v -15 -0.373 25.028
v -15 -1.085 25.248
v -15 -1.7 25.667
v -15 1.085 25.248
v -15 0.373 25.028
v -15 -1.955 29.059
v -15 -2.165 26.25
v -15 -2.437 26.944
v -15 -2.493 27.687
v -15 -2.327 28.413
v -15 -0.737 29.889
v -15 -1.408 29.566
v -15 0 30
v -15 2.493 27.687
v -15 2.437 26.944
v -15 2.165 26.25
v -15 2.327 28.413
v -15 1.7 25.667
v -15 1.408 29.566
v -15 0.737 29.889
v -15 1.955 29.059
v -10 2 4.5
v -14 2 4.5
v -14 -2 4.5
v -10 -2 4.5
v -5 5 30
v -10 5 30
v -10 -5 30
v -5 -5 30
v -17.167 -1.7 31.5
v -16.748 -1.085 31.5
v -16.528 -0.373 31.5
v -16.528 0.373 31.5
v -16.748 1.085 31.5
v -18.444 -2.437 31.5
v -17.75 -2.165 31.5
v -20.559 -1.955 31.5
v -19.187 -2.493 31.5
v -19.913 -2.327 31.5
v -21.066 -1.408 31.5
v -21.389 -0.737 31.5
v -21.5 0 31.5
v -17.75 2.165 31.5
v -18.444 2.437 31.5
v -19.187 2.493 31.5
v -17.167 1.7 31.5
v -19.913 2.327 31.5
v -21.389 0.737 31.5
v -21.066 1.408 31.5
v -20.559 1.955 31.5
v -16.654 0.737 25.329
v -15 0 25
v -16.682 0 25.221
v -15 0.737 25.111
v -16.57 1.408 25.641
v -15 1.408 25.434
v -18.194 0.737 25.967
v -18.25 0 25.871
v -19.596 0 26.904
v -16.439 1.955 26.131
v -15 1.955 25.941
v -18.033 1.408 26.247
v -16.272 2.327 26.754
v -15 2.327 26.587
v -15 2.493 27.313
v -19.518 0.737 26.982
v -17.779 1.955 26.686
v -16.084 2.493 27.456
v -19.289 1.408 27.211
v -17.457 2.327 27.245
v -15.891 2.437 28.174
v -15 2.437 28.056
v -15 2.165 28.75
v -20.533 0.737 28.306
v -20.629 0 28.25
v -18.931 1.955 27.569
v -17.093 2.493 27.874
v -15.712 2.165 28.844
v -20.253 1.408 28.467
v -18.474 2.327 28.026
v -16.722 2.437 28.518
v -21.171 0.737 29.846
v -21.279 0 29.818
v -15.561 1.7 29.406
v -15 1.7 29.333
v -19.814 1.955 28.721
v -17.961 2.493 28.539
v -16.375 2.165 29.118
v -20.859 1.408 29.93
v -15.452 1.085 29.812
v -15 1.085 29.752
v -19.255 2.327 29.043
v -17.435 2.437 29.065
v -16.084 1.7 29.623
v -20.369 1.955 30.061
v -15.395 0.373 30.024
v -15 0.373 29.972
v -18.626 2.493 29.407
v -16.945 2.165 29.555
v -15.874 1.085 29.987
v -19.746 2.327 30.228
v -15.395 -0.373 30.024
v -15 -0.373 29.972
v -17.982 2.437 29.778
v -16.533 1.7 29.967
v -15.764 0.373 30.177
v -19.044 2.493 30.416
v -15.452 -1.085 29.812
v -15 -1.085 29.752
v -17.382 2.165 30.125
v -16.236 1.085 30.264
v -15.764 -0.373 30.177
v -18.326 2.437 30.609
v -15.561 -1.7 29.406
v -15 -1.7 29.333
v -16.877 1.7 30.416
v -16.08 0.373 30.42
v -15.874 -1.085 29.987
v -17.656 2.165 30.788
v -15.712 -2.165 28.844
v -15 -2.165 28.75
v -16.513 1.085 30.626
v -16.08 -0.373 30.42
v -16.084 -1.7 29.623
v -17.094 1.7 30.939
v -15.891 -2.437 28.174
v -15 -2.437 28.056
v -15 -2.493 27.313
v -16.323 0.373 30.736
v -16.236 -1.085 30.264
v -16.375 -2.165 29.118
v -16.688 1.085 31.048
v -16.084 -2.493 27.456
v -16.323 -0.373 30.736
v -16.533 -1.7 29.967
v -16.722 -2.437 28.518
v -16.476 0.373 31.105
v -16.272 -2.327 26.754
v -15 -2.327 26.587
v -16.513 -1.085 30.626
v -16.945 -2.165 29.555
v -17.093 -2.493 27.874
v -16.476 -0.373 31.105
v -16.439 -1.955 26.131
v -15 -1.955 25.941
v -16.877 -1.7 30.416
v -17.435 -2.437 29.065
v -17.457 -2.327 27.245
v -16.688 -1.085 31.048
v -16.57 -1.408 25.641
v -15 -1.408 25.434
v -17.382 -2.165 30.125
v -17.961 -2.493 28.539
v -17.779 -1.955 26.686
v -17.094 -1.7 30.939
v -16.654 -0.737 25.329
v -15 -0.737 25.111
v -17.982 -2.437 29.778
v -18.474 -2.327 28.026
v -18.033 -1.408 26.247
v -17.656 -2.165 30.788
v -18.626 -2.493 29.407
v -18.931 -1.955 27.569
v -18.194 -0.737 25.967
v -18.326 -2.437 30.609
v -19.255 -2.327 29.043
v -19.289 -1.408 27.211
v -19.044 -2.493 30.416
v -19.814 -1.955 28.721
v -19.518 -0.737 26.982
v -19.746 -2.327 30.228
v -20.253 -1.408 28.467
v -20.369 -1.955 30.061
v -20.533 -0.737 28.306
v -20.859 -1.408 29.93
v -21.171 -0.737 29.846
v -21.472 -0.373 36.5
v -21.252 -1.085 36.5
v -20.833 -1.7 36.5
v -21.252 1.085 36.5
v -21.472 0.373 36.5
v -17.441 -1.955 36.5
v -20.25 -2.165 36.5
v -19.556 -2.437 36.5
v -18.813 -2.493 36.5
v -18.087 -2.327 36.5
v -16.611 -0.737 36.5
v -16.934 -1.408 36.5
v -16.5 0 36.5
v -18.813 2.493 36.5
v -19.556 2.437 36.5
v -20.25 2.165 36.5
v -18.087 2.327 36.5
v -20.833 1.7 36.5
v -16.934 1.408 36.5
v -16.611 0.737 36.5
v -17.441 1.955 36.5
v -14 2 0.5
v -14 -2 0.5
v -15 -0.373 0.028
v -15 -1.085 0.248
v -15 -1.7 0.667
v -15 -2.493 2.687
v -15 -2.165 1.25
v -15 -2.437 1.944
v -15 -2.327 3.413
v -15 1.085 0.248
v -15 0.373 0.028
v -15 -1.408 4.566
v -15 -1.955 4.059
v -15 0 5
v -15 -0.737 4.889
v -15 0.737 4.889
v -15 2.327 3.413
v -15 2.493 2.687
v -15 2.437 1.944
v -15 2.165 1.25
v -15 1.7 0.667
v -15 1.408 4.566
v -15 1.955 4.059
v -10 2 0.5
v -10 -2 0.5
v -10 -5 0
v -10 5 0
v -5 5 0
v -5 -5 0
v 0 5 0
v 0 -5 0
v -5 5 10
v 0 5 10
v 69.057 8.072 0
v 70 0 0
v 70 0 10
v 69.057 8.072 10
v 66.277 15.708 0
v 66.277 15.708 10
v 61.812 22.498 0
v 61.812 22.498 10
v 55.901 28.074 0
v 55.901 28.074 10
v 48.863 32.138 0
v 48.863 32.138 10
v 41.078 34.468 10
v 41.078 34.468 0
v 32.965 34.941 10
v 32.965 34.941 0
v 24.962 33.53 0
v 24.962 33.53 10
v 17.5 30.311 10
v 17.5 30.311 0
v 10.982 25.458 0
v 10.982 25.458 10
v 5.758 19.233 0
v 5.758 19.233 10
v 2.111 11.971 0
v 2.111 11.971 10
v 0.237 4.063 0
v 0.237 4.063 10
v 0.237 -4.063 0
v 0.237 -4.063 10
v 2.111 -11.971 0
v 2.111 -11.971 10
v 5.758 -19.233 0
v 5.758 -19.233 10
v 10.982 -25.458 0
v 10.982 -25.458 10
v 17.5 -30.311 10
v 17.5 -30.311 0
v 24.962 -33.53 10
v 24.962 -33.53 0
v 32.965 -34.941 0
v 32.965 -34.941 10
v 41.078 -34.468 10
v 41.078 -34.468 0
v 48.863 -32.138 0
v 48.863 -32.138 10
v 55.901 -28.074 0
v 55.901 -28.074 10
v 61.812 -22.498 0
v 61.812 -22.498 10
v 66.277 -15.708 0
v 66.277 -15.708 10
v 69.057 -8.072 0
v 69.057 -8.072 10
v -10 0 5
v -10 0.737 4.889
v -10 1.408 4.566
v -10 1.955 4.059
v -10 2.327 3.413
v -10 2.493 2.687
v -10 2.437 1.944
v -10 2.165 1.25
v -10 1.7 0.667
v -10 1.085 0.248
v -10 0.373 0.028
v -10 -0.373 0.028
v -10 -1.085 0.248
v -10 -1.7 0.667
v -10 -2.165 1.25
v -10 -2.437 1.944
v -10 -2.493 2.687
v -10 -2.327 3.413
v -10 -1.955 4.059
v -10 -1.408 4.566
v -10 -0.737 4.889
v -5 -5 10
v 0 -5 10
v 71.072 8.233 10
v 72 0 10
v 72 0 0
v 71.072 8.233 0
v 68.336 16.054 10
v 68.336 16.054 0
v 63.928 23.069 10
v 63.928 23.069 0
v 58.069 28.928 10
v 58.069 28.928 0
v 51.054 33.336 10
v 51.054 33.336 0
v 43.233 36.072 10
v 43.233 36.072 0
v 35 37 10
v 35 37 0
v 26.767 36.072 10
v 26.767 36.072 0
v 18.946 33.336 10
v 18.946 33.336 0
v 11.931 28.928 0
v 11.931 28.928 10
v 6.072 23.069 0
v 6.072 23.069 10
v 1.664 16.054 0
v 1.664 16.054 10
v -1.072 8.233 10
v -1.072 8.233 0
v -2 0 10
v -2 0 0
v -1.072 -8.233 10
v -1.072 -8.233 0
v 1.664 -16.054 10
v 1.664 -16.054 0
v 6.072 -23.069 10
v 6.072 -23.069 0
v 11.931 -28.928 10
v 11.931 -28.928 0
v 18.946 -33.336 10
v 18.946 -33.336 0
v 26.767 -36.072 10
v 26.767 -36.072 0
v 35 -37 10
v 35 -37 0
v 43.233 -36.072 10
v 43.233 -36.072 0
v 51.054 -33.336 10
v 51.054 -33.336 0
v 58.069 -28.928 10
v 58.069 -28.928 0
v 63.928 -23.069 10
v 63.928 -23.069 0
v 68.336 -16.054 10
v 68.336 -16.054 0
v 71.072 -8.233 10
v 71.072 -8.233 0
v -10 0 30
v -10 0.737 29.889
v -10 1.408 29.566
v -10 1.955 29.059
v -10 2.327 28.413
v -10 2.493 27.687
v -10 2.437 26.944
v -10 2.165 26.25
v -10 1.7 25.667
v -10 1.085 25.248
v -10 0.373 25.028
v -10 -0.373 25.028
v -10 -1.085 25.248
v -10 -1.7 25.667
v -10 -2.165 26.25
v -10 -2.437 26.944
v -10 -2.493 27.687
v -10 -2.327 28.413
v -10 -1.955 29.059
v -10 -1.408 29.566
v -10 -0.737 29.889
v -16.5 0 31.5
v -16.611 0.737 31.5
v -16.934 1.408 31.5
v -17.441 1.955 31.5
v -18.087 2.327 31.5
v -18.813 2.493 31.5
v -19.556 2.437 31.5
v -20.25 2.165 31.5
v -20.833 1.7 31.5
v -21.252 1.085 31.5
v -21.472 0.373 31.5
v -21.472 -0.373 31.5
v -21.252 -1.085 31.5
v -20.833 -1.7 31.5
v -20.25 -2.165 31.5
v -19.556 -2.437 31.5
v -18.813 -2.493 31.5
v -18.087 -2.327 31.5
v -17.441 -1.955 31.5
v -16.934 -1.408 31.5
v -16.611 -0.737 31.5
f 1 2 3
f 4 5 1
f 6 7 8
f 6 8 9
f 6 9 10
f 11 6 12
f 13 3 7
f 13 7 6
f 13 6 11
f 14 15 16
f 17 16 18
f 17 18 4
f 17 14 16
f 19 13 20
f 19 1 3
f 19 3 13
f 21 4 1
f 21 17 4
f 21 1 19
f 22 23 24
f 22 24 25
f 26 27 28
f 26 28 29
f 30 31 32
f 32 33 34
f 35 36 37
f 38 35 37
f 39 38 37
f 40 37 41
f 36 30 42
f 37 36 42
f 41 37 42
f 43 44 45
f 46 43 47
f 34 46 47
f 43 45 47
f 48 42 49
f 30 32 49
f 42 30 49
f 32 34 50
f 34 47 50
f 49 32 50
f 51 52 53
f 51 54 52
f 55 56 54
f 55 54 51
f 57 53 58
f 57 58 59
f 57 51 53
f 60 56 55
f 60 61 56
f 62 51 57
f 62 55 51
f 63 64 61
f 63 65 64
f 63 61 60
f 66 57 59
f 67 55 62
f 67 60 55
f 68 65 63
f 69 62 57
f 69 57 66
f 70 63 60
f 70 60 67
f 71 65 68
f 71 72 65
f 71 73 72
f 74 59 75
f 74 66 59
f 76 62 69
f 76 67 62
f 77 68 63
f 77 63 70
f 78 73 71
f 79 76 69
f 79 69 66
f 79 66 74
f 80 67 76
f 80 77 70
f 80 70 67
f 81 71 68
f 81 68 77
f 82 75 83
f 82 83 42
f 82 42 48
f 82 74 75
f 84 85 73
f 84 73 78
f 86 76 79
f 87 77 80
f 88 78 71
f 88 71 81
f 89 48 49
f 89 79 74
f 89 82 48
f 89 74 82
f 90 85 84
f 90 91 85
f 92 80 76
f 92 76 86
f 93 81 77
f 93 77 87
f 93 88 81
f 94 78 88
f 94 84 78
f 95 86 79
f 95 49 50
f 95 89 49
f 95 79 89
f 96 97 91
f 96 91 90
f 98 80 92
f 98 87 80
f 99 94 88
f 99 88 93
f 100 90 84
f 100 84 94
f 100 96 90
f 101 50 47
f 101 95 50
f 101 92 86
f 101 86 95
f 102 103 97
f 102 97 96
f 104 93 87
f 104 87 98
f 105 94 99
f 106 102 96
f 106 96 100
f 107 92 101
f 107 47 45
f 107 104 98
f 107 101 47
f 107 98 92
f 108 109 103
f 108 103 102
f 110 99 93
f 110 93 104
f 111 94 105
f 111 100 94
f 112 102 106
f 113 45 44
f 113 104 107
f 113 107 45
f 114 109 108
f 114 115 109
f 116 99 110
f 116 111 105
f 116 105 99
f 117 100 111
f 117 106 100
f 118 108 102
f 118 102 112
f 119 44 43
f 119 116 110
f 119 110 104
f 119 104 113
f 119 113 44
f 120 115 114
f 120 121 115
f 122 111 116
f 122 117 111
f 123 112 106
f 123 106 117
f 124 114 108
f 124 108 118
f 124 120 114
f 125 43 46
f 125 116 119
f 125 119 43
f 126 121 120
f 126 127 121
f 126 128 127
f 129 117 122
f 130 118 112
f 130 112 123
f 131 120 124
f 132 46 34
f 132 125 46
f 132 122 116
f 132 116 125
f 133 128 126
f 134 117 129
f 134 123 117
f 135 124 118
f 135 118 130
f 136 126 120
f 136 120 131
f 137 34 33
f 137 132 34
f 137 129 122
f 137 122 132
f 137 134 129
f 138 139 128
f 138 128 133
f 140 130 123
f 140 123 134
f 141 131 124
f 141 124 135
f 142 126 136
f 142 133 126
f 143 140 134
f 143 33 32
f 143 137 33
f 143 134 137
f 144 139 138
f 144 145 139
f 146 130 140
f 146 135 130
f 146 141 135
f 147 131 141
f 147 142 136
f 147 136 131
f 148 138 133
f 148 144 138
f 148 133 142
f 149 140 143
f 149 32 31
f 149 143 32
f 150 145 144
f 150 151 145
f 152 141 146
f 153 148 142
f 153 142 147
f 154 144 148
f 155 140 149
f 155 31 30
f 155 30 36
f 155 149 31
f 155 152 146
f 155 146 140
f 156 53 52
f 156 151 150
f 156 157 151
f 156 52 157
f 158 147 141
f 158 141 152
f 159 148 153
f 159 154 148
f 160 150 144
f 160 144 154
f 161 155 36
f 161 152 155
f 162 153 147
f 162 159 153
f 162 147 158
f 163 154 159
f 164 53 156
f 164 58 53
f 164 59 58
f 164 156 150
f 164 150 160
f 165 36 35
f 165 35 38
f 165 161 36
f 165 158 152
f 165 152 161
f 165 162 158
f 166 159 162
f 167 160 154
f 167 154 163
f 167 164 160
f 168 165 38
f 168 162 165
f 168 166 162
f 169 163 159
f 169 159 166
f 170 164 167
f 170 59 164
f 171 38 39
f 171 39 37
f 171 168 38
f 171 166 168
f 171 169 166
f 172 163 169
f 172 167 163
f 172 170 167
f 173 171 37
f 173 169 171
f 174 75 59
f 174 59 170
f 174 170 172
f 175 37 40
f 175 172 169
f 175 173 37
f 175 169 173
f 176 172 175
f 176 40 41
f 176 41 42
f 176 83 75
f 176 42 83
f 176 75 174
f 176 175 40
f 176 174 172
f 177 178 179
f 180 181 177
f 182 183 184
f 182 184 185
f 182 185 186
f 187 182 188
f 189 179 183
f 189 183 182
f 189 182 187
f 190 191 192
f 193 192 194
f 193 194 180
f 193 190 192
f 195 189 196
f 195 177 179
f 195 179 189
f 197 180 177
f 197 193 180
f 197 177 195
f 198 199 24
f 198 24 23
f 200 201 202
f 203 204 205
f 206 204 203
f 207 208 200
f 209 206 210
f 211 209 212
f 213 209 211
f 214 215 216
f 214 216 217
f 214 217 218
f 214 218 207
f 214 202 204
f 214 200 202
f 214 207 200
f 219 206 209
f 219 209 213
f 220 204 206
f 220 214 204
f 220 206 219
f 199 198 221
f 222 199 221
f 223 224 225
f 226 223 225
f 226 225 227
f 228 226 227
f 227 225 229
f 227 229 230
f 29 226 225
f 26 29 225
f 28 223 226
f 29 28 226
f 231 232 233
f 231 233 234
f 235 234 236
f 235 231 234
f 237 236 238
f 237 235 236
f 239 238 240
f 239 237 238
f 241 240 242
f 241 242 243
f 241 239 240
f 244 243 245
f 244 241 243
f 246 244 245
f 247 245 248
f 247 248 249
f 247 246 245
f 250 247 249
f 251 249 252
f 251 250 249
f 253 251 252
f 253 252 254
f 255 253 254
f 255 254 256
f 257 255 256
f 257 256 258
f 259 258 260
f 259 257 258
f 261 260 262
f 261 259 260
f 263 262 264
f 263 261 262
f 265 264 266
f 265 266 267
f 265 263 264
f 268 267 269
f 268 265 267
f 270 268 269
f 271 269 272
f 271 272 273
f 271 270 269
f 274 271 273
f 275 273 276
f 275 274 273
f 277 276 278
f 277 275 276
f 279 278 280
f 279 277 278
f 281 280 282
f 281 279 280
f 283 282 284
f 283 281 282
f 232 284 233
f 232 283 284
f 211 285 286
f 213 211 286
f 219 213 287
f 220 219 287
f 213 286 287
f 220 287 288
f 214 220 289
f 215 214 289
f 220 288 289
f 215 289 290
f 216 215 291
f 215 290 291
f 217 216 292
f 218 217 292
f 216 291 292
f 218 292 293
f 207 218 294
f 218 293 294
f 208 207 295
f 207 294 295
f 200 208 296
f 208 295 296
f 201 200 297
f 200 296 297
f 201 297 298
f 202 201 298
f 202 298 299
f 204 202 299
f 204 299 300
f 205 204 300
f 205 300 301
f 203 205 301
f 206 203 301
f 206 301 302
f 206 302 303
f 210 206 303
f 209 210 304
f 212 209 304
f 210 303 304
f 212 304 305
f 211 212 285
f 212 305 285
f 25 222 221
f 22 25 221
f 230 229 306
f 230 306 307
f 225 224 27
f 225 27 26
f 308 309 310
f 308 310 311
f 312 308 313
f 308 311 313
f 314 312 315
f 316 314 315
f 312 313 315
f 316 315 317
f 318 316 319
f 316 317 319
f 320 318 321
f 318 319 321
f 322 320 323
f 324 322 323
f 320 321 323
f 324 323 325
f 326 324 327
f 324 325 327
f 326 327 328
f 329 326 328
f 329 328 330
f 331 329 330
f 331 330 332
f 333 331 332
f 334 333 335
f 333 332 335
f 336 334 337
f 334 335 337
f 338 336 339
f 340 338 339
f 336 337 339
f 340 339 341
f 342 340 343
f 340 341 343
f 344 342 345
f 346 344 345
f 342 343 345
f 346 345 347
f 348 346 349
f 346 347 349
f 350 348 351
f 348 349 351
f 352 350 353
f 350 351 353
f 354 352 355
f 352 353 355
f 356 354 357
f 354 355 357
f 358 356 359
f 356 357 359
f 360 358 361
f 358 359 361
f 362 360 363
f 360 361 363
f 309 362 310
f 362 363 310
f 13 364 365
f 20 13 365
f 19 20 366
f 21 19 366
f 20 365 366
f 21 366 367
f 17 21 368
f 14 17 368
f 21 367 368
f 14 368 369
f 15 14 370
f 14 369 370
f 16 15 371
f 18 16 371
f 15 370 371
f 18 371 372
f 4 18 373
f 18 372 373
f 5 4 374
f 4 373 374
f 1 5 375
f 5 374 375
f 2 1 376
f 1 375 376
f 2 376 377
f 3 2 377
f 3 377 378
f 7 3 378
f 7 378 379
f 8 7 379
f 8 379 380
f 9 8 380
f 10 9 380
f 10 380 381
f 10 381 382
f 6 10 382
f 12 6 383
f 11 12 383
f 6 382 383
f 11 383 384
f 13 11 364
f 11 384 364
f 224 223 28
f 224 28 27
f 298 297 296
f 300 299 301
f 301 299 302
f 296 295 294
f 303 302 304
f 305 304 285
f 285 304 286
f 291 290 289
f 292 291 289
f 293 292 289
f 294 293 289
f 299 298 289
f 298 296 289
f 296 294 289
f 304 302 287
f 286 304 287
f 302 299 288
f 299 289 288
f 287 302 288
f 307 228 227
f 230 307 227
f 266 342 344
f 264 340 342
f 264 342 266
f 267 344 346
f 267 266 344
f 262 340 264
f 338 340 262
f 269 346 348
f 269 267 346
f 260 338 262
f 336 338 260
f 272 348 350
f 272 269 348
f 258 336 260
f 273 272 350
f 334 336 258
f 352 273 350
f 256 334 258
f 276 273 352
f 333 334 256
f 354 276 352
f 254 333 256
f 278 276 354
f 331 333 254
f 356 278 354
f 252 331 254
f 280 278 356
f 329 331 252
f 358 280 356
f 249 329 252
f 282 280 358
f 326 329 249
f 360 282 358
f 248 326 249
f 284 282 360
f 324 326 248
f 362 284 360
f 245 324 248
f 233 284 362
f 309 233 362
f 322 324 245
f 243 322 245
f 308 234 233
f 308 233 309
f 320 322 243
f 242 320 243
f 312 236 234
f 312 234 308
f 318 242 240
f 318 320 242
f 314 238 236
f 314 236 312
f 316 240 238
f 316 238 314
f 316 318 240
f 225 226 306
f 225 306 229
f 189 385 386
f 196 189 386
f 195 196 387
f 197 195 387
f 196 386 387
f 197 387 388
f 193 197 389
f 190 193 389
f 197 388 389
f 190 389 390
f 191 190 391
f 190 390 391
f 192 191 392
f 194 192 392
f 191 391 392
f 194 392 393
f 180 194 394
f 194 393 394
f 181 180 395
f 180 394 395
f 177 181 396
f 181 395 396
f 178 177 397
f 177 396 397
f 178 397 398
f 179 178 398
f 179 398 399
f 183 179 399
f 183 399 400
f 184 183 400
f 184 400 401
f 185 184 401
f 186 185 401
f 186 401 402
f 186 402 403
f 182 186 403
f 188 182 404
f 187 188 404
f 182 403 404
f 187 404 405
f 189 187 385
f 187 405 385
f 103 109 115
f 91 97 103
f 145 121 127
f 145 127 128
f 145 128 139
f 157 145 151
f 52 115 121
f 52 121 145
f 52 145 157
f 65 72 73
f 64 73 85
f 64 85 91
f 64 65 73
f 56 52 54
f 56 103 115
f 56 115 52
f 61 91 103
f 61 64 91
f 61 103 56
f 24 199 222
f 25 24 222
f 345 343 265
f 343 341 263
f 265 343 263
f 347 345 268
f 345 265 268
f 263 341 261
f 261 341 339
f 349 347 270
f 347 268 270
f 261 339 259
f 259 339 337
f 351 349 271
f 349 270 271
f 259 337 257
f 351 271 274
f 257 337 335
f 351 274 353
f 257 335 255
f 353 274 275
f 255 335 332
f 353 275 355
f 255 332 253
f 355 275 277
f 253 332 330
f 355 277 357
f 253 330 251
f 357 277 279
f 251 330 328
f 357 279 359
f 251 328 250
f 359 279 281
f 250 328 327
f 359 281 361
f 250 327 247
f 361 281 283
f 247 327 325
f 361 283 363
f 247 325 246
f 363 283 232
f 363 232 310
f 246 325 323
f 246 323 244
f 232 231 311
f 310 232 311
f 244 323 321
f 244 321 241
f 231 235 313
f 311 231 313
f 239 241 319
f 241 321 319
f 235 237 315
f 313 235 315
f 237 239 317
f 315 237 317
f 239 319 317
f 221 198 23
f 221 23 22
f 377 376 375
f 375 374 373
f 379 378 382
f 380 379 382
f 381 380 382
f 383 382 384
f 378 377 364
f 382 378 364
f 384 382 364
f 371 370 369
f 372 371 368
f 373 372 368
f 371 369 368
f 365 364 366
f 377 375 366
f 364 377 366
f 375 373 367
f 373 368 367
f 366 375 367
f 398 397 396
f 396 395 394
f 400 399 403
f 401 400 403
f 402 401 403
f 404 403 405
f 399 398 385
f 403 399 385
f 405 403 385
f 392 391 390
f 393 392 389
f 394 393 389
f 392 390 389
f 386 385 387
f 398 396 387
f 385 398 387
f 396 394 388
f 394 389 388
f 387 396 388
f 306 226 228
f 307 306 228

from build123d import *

# Parameters (mm, degrees)
BOX_W                   = 5
BOX_H                   = 10
BOX_DEPTH               = 10
BOX001_W                = 5
BOX001_H                = 10
BOX001_DEPTH            = 30
CYLINDER002_R           = 2.5
CYLINDER002_DEPTH       = 5
CYLINDER002_PITCH_ANGLE = -90
CYLINDER003_R           = 2.5
CYLINDER003_DEPTH       = 5
CYLINDER003_PITCH_ANGLE = -90
TORUS_R                 = 2.5
TORUS_ANGLE             = 90
CYLINDER004_R           = 2.5
CYLINDER004_DEPTH       = 5
BOX002_W                = 4
BOX002_H                = 4
BOX002_DEPTH            = 4
CYLINDER005_R           = 35
CYLINDER005_DEPTH       = 10
CYLINDER_R              = 37
CYLINDER_DEPTH          = 10


with BuildPart() as cube:
    # Box → Box (new body)
    with BuildSketch(Plane(origin=(-5, -5, 0), x_dir=(1, 0, 0), z_dir=(0, 0, 1))):
        with Locations((2.5, 5)):
            Rectangle(BOX_W, BOX_H)
    extrude(amount=BOX_DEPTH)


with BuildPart() as cube001:
    # Box001 → Box001 (new body)
    with BuildSketch(Plane(origin=(-10, -5, 0), x_dir=(1, 0, 0), z_dir=(0, 0, 1))):
        with Locations((2.5, 5)):
            Rectangle(BOX001_W, BOX001_H)
    extrude(amount=BOX001_DEPTH)


with BuildPart() as cylinder002:
    # Cylinder002 → Cylinder002 (new body)
    with BuildSketch(Plane.XY):
        Circle(CYLINDER002_R)
    extrude(amount=CYLINDER002_DEPTH)


with BuildPart() as cylinder002_1:
    # Cylinder002 pitch: moved
    add(cylinder002.part.rotate(Axis((0, 0, 0), (0, 1, 0)), CYLINDER002_PITCH_ANGLE))


with BuildPart() as cylinder002_2:
    # Cylinder002 placement: moved
    add(cylinder002_1.part.moved(Location((-10, 0, 2.5))))


with BuildPart() as cylinder003:
    # Cylinder003 → Cylinder003 (new body)
    with BuildSketch(Plane.XY):
        Circle(CYLINDER003_R)
    extrude(amount=CYLINDER003_DEPTH)


with BuildPart() as cylinder003_1:
    # Cylinder003 pitch: moved
    add(cylinder003.part.rotate(Axis((0, 0, 0), (0, 1, 0)), CYLINDER003_PITCH_ANGLE))


with BuildPart() as cylinder003_2:
    # Cylinder003 placement: moved
    add(cylinder003_1.part.moved(Location((-10, 0, 27.5))))


with BuildPart() as torus:
    # Torus → Torus (revolve)
    with BuildSketch(Plane(origin=(-15, 0, 31.5), x_dir=(0, 0, -1), z_dir=(1, 0, 0))):
        with Locations((4, 0)):
            Circle(TORUS_R)
    revolve(axis=Axis((-15, 0, 31.5), (0, 1, 0)), revolution_arc=TORUS_ANGLE)


with BuildPart() as cylinder004:
    # Cylinder004 → Cylinder004 (new body)
    with BuildSketch(Plane(origin=(-19, 0, 31.5), x_dir=(1, 0, 0), z_dir=(0, 0, 1))):
        Circle(CYLINDER004_R)
    extrude(amount=CYLINDER004_DEPTH)


with BuildPart() as cube002:
    # Box002 → Box002 (new body)
    with BuildSketch(Plane(origin=(-14, -2, 0.5), x_dir=(1, 0, 0), z_dir=(0, 0, 1))):
        with Locations((2, 2)):
            Rectangle(BOX002_W, BOX002_H)
    extrude(amount=BOX002_DEPTH)


with BuildPart() as cylinder005:
    # Cylinder005 → Cylinder005 (new body)
    with BuildSketch(Plane(origin=(35, 0, 0), x_dir=(1, 0, 0), z_dir=(0, 0, 1))):
        Circle(CYLINDER005_R)
    extrude(amount=CYLINDER005_DEPTH)


with BuildPart() as cut:
    # Cylinder → Cylinder (new body)
    with BuildSketch(Plane(origin=(35, 0, 0), x_dir=(1, 0, 0), z_dir=(0, 0, 1))):
        Circle(CYLINDER_R)
    extrude(amount=CYLINDER_DEPTH)

    # Cut: cut Cylinder005
    add(cylinder005.part, mode=Mode.SUBTRACT)


solid = Compound([cube.part, cube001.part, cylinder002_2.part, cylinder003_2.part, torus.part, cylinder004.part, cube002.part, cut.part])
